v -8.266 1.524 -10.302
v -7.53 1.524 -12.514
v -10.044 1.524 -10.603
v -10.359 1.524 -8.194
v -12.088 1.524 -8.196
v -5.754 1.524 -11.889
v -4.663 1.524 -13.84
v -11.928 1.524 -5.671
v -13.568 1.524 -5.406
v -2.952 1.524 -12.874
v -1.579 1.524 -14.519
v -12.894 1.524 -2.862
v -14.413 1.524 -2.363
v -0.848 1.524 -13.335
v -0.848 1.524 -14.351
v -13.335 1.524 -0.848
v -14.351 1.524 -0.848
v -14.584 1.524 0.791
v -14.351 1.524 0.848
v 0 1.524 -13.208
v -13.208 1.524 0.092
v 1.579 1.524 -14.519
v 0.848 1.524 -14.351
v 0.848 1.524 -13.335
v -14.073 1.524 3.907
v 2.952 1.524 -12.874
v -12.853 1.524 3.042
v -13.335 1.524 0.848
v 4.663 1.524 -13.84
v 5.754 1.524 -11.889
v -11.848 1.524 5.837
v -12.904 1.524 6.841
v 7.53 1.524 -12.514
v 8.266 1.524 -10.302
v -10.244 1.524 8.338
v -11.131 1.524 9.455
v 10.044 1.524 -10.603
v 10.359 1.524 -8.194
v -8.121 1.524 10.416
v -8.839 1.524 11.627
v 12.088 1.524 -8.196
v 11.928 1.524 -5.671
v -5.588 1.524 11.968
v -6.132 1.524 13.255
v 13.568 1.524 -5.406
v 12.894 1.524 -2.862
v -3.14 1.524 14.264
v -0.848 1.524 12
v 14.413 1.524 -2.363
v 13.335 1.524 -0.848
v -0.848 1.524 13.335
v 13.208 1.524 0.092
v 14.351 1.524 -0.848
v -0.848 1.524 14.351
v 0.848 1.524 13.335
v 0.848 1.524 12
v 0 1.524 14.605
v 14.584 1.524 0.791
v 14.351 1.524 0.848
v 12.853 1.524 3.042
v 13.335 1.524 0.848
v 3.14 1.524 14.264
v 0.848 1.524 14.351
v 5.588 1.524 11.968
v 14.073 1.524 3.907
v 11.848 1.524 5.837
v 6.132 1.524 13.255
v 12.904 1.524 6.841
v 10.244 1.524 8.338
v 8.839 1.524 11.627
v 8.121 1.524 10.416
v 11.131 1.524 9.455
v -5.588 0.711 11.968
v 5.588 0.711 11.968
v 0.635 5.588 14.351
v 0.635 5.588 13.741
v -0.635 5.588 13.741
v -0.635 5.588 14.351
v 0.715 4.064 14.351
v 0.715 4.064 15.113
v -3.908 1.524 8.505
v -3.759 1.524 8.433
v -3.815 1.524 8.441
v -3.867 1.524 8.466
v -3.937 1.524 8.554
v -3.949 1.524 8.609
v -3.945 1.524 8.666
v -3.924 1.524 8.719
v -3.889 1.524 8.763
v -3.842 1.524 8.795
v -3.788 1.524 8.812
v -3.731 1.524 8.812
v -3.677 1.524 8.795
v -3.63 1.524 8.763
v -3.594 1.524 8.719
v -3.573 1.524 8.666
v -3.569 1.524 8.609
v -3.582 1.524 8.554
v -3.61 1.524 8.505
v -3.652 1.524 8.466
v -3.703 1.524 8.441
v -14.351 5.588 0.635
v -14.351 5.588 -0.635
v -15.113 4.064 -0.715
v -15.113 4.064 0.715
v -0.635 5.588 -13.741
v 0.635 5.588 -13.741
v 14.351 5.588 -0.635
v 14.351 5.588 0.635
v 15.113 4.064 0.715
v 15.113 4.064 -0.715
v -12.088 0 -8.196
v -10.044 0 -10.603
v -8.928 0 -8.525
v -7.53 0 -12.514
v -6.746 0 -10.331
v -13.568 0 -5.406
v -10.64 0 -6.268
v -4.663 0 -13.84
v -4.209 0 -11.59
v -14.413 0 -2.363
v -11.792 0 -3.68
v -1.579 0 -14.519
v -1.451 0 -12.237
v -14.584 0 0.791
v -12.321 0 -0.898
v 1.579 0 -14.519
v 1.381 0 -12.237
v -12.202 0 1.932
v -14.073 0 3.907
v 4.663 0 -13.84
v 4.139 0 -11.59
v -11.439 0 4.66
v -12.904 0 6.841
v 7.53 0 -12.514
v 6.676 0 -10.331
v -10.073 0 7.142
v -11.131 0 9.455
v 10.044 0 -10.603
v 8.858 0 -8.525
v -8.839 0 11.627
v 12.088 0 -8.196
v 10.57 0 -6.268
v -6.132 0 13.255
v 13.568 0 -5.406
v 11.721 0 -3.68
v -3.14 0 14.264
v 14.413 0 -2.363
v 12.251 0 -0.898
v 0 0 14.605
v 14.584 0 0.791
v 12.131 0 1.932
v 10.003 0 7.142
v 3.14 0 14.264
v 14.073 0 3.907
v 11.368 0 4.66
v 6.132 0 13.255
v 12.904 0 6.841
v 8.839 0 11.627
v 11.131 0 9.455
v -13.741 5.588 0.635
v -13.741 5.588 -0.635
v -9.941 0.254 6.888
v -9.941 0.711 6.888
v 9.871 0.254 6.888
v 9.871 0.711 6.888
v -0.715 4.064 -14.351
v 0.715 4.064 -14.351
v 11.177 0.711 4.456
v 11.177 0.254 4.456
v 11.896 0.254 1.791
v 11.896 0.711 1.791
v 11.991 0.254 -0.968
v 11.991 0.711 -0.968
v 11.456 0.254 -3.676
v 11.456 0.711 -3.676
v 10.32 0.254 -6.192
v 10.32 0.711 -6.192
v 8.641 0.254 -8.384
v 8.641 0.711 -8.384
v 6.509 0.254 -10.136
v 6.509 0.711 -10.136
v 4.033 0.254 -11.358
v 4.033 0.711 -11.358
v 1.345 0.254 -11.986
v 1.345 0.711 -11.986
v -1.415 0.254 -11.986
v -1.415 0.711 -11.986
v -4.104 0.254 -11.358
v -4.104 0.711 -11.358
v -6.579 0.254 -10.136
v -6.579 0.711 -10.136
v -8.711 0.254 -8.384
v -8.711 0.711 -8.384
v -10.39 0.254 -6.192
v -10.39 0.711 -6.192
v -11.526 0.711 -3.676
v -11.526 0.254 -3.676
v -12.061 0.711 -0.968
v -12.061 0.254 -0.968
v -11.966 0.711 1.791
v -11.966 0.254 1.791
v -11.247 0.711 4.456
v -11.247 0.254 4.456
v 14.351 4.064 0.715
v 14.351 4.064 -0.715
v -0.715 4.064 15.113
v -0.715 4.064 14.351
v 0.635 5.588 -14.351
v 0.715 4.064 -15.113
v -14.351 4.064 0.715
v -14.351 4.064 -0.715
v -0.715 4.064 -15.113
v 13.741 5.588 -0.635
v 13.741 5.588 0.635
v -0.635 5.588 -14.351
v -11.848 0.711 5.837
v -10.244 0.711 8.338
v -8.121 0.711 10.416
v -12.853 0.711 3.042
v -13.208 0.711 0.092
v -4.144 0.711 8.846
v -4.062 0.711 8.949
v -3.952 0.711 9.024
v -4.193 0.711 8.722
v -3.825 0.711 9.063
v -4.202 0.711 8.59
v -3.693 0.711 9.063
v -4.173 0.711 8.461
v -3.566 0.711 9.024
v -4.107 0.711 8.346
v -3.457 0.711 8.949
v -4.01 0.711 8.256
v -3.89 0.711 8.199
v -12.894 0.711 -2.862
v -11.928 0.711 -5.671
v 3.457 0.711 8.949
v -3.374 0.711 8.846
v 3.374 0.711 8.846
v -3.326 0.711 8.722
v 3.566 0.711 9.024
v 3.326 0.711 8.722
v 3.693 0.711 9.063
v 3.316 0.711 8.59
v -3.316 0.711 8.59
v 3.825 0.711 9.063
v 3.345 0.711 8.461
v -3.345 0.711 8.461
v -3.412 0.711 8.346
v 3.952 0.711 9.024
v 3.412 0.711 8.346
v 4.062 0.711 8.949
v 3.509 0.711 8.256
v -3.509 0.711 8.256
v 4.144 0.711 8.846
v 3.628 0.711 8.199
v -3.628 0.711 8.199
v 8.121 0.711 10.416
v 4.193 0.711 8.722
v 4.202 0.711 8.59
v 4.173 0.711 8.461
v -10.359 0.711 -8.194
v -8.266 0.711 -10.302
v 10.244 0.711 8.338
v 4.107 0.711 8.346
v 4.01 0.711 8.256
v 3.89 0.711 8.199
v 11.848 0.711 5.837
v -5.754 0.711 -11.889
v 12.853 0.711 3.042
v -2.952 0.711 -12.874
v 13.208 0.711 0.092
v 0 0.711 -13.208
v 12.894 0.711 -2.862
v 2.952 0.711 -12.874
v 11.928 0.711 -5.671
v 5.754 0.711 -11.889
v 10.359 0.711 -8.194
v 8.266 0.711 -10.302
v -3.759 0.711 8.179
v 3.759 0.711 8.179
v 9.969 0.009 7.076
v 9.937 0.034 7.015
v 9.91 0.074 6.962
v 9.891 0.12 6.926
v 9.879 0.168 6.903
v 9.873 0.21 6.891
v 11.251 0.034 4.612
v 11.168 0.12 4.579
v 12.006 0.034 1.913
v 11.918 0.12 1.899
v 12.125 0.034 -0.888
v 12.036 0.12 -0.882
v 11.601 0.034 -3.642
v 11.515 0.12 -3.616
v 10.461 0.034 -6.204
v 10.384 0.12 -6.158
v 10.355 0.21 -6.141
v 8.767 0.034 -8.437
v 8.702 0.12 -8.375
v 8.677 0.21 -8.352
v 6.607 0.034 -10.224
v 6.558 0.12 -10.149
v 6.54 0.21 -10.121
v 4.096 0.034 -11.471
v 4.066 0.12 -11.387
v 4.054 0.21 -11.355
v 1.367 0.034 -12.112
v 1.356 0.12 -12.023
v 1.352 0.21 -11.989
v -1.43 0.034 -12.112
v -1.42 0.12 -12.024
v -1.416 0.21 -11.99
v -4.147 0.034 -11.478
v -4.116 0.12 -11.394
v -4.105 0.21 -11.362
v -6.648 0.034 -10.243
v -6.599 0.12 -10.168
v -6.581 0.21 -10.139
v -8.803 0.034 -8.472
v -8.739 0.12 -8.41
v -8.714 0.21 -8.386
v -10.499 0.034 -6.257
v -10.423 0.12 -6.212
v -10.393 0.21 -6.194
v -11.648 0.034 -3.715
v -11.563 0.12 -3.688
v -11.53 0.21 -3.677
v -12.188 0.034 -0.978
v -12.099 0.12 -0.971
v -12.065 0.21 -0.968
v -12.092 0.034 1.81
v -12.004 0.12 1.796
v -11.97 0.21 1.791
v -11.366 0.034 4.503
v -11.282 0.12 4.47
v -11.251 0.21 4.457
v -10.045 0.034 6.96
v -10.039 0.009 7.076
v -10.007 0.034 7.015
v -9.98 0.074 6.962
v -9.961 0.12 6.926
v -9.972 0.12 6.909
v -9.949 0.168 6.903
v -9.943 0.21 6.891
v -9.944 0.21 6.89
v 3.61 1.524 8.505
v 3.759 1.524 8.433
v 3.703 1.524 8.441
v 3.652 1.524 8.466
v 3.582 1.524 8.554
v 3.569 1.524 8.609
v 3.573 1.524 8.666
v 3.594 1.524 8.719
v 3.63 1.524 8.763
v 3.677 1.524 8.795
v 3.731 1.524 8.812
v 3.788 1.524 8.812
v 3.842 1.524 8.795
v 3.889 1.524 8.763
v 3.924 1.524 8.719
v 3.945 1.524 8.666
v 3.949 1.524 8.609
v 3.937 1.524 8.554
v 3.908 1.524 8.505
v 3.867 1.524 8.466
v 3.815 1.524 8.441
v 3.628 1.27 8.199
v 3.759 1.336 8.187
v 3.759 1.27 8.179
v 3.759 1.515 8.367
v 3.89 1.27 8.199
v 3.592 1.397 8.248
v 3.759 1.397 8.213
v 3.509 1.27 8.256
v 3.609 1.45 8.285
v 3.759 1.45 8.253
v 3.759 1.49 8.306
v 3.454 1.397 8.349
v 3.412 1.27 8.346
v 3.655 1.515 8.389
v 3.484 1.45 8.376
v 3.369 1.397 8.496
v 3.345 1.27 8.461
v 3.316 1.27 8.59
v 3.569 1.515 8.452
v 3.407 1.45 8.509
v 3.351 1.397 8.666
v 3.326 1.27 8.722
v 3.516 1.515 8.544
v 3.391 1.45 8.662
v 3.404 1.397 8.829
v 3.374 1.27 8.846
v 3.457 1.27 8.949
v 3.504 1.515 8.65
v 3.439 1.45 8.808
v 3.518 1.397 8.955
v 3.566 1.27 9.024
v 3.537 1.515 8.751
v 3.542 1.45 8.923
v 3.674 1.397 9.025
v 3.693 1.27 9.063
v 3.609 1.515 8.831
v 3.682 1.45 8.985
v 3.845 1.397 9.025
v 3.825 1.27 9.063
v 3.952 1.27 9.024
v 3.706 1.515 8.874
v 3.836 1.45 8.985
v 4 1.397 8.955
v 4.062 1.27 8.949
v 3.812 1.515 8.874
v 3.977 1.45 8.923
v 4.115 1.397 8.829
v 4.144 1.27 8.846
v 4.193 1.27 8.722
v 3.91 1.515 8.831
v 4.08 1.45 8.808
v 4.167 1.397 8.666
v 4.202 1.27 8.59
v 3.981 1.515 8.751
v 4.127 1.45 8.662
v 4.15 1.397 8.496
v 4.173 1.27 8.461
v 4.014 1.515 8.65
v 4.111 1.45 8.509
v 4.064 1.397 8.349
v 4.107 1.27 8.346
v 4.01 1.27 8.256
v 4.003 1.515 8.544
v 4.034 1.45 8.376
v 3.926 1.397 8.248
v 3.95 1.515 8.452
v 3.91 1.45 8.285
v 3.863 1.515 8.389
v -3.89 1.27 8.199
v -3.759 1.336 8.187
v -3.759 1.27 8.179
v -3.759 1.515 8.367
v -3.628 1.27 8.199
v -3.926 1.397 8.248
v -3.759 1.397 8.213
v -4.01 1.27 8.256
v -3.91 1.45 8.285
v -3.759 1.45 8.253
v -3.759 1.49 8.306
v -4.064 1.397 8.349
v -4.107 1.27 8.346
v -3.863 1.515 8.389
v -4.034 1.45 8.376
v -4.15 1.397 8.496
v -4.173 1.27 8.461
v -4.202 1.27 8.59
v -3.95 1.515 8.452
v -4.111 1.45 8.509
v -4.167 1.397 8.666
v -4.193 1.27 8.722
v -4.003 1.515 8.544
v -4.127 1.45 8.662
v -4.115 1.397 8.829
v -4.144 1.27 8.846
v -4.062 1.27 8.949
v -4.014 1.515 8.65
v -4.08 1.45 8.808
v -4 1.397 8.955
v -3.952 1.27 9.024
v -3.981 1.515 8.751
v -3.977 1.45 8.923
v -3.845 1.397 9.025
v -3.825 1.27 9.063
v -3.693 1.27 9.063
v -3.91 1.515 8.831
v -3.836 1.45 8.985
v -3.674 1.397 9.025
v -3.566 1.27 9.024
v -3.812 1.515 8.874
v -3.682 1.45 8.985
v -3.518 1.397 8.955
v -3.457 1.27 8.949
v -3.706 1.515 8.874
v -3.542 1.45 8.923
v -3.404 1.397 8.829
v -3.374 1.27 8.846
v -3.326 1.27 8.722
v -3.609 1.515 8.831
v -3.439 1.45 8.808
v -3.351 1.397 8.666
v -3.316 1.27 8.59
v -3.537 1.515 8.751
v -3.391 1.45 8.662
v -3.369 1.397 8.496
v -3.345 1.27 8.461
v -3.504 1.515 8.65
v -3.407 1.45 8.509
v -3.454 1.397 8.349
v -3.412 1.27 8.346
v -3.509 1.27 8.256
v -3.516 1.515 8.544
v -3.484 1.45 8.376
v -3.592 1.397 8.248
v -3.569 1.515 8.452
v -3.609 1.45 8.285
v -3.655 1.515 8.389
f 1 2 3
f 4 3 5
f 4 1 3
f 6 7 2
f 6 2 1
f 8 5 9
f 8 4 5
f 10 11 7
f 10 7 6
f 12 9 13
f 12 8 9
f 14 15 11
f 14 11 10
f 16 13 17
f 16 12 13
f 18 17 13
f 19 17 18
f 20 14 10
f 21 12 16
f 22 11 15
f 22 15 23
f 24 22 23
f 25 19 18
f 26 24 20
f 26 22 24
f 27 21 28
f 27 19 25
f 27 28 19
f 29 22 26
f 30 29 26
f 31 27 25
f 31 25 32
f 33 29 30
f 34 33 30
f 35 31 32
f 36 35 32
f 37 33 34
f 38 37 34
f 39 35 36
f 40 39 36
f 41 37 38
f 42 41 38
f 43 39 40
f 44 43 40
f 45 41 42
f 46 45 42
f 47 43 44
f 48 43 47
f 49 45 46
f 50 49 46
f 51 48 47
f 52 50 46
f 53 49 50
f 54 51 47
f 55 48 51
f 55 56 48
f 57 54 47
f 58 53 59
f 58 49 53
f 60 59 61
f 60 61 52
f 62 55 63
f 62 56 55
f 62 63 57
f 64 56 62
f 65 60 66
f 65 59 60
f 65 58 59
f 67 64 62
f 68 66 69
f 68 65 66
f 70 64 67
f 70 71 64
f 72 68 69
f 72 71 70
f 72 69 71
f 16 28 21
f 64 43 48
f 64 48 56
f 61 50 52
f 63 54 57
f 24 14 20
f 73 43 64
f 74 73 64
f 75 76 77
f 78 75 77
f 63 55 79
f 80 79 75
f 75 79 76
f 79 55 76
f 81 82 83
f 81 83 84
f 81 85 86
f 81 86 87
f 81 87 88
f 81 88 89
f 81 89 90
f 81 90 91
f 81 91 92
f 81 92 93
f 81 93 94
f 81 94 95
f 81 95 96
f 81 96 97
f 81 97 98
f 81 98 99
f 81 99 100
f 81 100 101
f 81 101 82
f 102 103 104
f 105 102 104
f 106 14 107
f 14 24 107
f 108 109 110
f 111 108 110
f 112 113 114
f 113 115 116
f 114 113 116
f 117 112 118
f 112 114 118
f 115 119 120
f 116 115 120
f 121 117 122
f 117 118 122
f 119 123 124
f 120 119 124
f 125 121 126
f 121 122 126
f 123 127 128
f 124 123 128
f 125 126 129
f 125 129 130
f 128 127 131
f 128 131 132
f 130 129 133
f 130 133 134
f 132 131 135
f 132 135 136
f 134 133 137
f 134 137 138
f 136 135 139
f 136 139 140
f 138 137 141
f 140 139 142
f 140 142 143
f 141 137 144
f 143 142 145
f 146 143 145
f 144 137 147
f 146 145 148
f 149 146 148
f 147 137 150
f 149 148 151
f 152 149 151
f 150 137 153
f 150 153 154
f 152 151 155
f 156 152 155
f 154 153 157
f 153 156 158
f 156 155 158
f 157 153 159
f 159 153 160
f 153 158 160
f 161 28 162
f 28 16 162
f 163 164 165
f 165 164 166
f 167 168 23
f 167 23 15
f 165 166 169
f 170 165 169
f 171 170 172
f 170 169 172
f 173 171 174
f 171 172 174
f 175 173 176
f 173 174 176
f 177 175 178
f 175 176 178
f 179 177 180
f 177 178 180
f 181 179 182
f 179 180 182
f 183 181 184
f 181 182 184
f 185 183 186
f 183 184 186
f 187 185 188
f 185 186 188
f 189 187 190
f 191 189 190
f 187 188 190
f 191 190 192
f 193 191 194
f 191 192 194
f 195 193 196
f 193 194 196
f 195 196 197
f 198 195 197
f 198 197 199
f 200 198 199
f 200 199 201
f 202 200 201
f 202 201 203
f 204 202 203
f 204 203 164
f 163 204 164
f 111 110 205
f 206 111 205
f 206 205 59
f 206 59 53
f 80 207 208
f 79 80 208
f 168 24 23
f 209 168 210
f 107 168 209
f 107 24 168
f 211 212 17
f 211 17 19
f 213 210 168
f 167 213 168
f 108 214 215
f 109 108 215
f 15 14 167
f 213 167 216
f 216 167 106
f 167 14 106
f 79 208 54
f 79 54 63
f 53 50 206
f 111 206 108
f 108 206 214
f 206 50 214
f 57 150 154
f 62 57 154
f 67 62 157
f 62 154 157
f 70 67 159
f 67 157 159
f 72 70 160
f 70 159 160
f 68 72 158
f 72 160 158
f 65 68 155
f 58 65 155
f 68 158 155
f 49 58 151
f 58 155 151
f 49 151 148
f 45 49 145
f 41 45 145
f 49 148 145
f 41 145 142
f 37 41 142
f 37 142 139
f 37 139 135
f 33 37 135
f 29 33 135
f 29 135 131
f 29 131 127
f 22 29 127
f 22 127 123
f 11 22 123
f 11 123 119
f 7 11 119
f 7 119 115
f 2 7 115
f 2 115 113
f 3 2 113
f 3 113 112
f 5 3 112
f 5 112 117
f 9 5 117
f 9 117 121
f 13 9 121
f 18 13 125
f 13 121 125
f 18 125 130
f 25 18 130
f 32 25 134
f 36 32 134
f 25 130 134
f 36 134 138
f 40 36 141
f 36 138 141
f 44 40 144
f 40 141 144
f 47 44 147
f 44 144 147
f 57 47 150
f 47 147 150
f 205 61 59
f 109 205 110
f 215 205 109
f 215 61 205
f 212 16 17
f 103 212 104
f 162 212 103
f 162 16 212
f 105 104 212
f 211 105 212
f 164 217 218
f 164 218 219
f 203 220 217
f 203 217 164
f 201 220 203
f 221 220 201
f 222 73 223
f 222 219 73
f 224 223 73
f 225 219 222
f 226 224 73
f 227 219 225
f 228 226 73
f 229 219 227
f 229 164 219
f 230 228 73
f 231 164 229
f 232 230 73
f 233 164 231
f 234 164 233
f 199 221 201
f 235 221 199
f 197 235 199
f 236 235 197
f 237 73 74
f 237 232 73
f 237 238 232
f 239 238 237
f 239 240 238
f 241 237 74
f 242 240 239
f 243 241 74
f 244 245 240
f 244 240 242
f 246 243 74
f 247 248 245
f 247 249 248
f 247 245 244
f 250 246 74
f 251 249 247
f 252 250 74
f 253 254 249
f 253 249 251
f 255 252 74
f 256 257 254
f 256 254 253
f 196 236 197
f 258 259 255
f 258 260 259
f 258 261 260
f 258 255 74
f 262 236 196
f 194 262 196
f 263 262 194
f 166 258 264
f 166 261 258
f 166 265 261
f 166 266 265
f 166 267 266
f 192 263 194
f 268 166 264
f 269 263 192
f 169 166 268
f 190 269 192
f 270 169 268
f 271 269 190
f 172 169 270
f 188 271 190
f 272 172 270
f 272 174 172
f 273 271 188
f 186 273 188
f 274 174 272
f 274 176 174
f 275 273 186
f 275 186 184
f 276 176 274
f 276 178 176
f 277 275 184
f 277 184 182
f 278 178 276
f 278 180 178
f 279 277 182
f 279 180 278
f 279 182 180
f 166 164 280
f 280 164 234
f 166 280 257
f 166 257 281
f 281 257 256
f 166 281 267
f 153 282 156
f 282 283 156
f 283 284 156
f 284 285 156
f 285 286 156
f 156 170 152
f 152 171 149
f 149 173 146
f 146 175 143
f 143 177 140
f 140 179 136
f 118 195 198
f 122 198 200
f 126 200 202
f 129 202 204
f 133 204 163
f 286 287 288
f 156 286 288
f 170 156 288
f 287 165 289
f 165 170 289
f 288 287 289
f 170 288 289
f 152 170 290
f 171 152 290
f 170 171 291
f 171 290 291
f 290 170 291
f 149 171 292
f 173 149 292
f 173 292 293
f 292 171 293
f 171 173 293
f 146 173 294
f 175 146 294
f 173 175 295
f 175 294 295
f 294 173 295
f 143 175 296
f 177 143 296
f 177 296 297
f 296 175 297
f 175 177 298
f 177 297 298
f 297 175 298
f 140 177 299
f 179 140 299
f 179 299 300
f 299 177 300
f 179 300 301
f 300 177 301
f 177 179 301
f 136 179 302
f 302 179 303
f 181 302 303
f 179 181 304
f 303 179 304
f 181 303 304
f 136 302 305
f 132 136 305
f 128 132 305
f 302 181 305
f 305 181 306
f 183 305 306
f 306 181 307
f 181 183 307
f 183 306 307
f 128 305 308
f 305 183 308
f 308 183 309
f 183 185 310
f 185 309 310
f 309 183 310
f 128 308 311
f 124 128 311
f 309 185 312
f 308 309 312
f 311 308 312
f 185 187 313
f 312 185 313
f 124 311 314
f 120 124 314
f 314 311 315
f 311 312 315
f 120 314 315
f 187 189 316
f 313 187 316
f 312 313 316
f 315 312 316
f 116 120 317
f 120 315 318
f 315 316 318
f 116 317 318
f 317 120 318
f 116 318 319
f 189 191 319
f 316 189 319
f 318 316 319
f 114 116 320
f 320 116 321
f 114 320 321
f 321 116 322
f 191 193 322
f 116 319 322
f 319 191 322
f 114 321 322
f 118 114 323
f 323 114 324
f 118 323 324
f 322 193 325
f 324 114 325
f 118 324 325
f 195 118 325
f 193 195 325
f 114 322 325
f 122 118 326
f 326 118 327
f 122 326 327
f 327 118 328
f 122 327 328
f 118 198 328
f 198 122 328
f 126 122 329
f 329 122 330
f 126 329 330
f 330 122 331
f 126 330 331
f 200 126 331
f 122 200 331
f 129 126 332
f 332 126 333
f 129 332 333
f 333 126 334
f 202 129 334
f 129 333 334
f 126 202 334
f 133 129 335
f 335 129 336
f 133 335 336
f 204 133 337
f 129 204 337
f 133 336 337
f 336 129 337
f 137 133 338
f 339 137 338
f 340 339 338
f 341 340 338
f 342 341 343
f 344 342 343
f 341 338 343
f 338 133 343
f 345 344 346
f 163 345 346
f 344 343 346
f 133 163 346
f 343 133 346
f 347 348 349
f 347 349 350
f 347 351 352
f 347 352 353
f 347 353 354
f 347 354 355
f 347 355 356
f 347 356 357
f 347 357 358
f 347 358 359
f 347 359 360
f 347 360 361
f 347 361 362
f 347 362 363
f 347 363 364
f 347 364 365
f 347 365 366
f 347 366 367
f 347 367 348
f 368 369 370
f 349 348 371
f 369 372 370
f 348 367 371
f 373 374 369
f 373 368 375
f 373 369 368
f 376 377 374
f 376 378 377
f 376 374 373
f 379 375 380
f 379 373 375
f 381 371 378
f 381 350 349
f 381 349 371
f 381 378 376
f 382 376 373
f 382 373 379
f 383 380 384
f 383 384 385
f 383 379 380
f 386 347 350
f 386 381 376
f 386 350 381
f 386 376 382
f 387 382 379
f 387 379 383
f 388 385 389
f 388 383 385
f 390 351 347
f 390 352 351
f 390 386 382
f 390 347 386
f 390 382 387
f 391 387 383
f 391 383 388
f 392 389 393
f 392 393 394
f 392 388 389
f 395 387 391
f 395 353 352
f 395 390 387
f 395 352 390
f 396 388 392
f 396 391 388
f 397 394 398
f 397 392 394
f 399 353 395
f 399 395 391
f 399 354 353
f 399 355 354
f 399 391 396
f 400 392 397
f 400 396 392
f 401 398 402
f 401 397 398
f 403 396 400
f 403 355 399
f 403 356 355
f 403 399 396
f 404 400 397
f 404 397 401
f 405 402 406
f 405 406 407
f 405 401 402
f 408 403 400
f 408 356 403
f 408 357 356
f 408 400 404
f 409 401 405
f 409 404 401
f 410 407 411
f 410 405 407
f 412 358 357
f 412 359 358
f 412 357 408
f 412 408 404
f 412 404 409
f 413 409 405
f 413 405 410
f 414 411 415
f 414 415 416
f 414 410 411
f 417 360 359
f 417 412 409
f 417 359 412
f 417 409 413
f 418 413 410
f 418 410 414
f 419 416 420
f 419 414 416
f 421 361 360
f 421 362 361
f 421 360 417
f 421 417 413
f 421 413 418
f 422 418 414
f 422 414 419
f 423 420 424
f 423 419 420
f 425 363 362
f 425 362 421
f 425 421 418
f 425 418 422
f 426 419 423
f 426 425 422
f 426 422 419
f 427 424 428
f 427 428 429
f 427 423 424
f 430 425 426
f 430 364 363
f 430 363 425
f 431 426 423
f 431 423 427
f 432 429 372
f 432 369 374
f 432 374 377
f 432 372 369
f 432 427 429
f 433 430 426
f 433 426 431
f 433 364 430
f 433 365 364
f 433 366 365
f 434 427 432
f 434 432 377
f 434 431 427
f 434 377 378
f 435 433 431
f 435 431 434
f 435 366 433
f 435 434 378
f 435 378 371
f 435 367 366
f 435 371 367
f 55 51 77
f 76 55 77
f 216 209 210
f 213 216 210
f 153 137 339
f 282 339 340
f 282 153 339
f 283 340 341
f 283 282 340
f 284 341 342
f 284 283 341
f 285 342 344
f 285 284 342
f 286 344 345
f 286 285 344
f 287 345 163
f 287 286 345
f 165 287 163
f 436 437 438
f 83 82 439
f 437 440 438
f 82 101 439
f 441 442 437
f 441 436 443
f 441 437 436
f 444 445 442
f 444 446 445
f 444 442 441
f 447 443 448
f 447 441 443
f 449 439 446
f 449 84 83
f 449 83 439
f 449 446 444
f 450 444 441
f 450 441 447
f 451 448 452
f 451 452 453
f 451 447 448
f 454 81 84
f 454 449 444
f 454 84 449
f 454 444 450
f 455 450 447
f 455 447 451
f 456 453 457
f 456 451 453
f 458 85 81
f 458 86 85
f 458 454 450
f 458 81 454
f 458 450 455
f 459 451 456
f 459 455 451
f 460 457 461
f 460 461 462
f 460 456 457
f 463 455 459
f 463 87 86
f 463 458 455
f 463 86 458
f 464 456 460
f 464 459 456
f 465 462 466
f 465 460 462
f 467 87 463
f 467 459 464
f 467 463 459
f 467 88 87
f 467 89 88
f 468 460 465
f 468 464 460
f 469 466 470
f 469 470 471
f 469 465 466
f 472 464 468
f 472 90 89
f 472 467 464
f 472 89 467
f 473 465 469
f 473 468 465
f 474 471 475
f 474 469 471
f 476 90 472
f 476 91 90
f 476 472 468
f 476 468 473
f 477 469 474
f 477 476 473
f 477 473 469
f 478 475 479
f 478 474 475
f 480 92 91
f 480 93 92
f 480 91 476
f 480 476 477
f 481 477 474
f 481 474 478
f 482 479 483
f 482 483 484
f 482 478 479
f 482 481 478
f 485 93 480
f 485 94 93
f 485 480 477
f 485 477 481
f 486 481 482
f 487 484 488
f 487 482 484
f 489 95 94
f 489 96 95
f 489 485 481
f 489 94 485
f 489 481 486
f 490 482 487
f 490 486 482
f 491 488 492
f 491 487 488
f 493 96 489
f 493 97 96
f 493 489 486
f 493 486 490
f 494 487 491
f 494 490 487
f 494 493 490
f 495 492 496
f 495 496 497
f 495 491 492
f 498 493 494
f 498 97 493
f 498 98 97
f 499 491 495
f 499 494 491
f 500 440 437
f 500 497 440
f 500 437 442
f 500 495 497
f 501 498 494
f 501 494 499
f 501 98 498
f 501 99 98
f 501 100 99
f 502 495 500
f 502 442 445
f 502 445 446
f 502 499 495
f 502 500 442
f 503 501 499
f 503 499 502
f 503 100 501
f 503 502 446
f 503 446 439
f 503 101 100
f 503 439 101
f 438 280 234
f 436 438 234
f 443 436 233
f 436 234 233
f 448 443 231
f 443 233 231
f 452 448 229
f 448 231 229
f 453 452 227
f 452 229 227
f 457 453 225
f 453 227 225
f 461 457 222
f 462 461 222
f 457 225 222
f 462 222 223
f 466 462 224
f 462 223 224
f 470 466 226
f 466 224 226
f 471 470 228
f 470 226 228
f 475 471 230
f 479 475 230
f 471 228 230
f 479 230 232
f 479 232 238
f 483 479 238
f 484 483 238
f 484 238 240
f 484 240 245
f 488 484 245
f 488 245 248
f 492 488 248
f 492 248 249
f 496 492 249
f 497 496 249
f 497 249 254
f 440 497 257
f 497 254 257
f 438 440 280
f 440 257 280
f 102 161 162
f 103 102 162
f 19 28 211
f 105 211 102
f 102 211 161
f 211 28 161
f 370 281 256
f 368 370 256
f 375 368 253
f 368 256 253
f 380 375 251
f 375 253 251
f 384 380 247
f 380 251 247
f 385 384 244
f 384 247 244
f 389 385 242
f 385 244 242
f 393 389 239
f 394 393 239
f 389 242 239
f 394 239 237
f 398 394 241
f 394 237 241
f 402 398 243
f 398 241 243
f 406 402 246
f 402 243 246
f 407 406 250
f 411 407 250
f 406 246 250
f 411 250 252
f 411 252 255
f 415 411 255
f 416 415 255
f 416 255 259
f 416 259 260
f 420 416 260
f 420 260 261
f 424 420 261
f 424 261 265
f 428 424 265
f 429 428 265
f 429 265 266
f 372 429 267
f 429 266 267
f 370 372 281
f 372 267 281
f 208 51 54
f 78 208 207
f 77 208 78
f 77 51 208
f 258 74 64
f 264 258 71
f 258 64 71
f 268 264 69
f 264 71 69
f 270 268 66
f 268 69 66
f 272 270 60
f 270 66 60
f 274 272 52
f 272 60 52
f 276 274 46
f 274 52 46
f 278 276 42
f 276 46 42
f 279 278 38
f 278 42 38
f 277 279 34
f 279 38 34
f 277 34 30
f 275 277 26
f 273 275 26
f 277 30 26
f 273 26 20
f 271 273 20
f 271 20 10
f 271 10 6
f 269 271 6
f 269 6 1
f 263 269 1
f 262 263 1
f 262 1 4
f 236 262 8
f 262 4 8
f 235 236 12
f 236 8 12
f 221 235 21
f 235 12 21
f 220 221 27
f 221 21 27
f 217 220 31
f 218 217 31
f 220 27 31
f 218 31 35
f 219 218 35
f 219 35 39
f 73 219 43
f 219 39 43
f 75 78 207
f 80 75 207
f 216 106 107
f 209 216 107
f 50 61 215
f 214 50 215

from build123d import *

# Parameters (mm, degrees)
SKETCH1_R           = 14.605
BOSS_EXTRUDE1_DEPTH = 1.524
CUT_EXTRUDE1_DEPTH  = 0.8128
SKETCH4_R           = 0.4445
BOSS_EXTRUDE2_DEPTH = 0.8128
CUT_EXTRUDE2_DEPTH  = 21.670575557
FILLET1_R           = 0.254
FILLET3_R           = 0.254
SNAP_START          = 13.7414
SNAP_HOOK1_DEPTH    = 0.6096
SNAP_START_2        = -0.714869456
SNAP_HOOK1_2_DEPTH  = 1.429738912
SNAP_START_3        = -0.847985215
SNAP_HOOK1_3_DEPTH  = 1.69597043
SNAP_START_4        = 12
SNAP_HOOK1_4_DEPTH  = 4
CIRPATTERN1_COUNT   = 4


with BuildPart() as part:
    # Sketch1 → Boss-Extrude1 (new body)
    with BuildSketch(Plane(origin=(0, 0, 0), x_dir=(1, 0, 0), z_dir=(0, 1, 0))):
        with Locations(Location((0, 0, 0), (0, 0, 270))):
            Circle(SKETCH1_R)
    extrude(amount=BOSS_EXTRUDE1_DEPTH)

    # Sketch3 → Cut-Extrude1 (cut)
    with BuildSketch(Plane(origin=(0, 1.524, 0), x_dir=(1, 0, 0), z_dir=(0, 1, 0))):
        with BuildLine():
            Line((-5.588, -11.967686493), (5.588, -11.967686493))
            ThreePointArc((5.588, -11.967686493), (0, 13.208), (-5.588, -11.967686493))
        make_face()
    extrude(amount=-CUT_EXTRUDE1_DEPTH, mode=Mode.SUBTRACT)

    # Sketch4 → Boss-Extrude2 (add)
    with BuildSketch(Plane(origin=(0, 0.7112, 0), x_dir=(1, 0, 0), z_dir=(0, 1, 0))):
        with Locations(Location((-3.7592, -8.6233, 0), (0, 0, 90))):
            Circle(SKETCH4_R)
        with Locations(Location((3.7592, -8.6233, 0), (0, 0, 90))):
            Circle(SKETCH4_R)
    extrude(amount=BOSS_EXTRUDE2_DEPTH)

    # Sketch5 → Cut-Extrude2 (cut, through all)
    with BuildSketch(Plane(origin=(0, 0.7112, 0), x_dir=(1, 0, 0), z_dir=(0, 1, 0))):
        with BuildLine():
            Line((-9.940854815, -6.887686493), (9.870656967, -6.887686493))
            ThreePointArc((9.870656967, -6.887686493), (-0.035098924, 12.065), (-9.940854815, -6.887686493))
        make_face()
    extrude(amount=-CUT_EXTRUDE2_DEPTH, mode=Mode.SUBTRACT)

    # Fillet1
    fillet1_edges = [part.edges().sort_by_distance(p)[0] for p in [
        (-0.035098924, 0, -12.065),
        (-0.035098924, 0, 6.887686493),
    ]]
    fillet(fillet1_edges, radius=FILLET1_R)

    # Fillet3
    fillet3_edges = [part.edges().sort_by_distance(p)[0] for p in [
        (-3.7592, 1.524, 9.0678),
        (3.7592, 1.524, 9.0678),
    ]]
    fillet(fillet3_edges, radius=FILLET3_R)

    # Snap Hook1: read off the stored shape, not the designer's step
    # Snap Hook1 outline → Snap Hook1 (add)
    with BuildSketch(Plane.XY.offset(SNAP_START)):
        Polygon((-0.847985215, 1.524), (0.847985215, 1.524), (0.635, 5.588), (-0.635, 5.588), align=None)
    snap_hook1 = extrude(amount=SNAP_HOOK1_DEPTH)

    # Snap Hook1 2 outline → Snap Hook1 2 (add)
    with BuildSketch(Plane.YZ.offset(SNAP_START_2)):
        Polygon((1.524, 13.7414), (1.524, 13.335), (5.588, 13.7414), align=None)
        Polygon((4.064, 15.113), (4.064, 14.351), (5.588, 14.351), align=None)
    snap_hook1_2 = extrude(amount=SNAP_HOOK1_2_DEPTH)

    # Snap Hook1 3 outline → Snap Hook1 3 (add)
    with BuildSketch(Plane.YZ.offset(SNAP_START_3)):
        Polygon((1.524, 13.7414), (1.524, 13.335), (5.588, 13.7414), align=None)
    snap_hook1_3 = extrude(amount=SNAP_HOOK1_3_DEPTH)

    # Snap Hook1 4 outline → Snap Hook1 4 (cut)
    with BuildSketch(Plane.XY.offset(SNAP_START_4)):
        Polygon((0.847985215, 1.524), (0.847985215, 7), (0.561000216, 7), (0.635, 5.588), align=None)
        Polygon((-0.635, 5.588), (-0.561000216, 7), (-0.847985215, 7), (-0.847985215, 1.524), align=None)
    snap_hook1_4 = extrude(amount=SNAP_HOOK1_4_DEPTH, mode=Mode.SUBTRACT)

    # CirPattern1: Snap Hook1, Snap Hook1 2, Snap Hook1 3, Snap Hook1 4 ×4 about axis
    cirpattern1_axis = Axis((0, 1.524, 0), (0, 1, 0))
    add([snap_hook1.rotate(cirpattern1_axis, i * 360 / CIRPATTERN1_COUNT) for i in range(1, CIRPATTERN1_COUNT)])
    add([snap_hook1_2.rotate(cirpattern1_axis, i * 360 / CIRPATTERN1_COUNT) for i in range(1, CIRPATTERN1_COUNT)])
    add([snap_hook1_3.rotate(cirpattern1_axis, i * 360 / CIRPATTERN1_COUNT) for i in range(1, CIRPATTERN1_COUNT)])
    add([snap_hook1_4.rotate(cirpattern1_axis, i * 360 / CIRPATTERN1_COUNT) for i in range(1, CIRPATTERN1_COUNT)], mode=Mode.SUBTRACT)


solid = part.part
